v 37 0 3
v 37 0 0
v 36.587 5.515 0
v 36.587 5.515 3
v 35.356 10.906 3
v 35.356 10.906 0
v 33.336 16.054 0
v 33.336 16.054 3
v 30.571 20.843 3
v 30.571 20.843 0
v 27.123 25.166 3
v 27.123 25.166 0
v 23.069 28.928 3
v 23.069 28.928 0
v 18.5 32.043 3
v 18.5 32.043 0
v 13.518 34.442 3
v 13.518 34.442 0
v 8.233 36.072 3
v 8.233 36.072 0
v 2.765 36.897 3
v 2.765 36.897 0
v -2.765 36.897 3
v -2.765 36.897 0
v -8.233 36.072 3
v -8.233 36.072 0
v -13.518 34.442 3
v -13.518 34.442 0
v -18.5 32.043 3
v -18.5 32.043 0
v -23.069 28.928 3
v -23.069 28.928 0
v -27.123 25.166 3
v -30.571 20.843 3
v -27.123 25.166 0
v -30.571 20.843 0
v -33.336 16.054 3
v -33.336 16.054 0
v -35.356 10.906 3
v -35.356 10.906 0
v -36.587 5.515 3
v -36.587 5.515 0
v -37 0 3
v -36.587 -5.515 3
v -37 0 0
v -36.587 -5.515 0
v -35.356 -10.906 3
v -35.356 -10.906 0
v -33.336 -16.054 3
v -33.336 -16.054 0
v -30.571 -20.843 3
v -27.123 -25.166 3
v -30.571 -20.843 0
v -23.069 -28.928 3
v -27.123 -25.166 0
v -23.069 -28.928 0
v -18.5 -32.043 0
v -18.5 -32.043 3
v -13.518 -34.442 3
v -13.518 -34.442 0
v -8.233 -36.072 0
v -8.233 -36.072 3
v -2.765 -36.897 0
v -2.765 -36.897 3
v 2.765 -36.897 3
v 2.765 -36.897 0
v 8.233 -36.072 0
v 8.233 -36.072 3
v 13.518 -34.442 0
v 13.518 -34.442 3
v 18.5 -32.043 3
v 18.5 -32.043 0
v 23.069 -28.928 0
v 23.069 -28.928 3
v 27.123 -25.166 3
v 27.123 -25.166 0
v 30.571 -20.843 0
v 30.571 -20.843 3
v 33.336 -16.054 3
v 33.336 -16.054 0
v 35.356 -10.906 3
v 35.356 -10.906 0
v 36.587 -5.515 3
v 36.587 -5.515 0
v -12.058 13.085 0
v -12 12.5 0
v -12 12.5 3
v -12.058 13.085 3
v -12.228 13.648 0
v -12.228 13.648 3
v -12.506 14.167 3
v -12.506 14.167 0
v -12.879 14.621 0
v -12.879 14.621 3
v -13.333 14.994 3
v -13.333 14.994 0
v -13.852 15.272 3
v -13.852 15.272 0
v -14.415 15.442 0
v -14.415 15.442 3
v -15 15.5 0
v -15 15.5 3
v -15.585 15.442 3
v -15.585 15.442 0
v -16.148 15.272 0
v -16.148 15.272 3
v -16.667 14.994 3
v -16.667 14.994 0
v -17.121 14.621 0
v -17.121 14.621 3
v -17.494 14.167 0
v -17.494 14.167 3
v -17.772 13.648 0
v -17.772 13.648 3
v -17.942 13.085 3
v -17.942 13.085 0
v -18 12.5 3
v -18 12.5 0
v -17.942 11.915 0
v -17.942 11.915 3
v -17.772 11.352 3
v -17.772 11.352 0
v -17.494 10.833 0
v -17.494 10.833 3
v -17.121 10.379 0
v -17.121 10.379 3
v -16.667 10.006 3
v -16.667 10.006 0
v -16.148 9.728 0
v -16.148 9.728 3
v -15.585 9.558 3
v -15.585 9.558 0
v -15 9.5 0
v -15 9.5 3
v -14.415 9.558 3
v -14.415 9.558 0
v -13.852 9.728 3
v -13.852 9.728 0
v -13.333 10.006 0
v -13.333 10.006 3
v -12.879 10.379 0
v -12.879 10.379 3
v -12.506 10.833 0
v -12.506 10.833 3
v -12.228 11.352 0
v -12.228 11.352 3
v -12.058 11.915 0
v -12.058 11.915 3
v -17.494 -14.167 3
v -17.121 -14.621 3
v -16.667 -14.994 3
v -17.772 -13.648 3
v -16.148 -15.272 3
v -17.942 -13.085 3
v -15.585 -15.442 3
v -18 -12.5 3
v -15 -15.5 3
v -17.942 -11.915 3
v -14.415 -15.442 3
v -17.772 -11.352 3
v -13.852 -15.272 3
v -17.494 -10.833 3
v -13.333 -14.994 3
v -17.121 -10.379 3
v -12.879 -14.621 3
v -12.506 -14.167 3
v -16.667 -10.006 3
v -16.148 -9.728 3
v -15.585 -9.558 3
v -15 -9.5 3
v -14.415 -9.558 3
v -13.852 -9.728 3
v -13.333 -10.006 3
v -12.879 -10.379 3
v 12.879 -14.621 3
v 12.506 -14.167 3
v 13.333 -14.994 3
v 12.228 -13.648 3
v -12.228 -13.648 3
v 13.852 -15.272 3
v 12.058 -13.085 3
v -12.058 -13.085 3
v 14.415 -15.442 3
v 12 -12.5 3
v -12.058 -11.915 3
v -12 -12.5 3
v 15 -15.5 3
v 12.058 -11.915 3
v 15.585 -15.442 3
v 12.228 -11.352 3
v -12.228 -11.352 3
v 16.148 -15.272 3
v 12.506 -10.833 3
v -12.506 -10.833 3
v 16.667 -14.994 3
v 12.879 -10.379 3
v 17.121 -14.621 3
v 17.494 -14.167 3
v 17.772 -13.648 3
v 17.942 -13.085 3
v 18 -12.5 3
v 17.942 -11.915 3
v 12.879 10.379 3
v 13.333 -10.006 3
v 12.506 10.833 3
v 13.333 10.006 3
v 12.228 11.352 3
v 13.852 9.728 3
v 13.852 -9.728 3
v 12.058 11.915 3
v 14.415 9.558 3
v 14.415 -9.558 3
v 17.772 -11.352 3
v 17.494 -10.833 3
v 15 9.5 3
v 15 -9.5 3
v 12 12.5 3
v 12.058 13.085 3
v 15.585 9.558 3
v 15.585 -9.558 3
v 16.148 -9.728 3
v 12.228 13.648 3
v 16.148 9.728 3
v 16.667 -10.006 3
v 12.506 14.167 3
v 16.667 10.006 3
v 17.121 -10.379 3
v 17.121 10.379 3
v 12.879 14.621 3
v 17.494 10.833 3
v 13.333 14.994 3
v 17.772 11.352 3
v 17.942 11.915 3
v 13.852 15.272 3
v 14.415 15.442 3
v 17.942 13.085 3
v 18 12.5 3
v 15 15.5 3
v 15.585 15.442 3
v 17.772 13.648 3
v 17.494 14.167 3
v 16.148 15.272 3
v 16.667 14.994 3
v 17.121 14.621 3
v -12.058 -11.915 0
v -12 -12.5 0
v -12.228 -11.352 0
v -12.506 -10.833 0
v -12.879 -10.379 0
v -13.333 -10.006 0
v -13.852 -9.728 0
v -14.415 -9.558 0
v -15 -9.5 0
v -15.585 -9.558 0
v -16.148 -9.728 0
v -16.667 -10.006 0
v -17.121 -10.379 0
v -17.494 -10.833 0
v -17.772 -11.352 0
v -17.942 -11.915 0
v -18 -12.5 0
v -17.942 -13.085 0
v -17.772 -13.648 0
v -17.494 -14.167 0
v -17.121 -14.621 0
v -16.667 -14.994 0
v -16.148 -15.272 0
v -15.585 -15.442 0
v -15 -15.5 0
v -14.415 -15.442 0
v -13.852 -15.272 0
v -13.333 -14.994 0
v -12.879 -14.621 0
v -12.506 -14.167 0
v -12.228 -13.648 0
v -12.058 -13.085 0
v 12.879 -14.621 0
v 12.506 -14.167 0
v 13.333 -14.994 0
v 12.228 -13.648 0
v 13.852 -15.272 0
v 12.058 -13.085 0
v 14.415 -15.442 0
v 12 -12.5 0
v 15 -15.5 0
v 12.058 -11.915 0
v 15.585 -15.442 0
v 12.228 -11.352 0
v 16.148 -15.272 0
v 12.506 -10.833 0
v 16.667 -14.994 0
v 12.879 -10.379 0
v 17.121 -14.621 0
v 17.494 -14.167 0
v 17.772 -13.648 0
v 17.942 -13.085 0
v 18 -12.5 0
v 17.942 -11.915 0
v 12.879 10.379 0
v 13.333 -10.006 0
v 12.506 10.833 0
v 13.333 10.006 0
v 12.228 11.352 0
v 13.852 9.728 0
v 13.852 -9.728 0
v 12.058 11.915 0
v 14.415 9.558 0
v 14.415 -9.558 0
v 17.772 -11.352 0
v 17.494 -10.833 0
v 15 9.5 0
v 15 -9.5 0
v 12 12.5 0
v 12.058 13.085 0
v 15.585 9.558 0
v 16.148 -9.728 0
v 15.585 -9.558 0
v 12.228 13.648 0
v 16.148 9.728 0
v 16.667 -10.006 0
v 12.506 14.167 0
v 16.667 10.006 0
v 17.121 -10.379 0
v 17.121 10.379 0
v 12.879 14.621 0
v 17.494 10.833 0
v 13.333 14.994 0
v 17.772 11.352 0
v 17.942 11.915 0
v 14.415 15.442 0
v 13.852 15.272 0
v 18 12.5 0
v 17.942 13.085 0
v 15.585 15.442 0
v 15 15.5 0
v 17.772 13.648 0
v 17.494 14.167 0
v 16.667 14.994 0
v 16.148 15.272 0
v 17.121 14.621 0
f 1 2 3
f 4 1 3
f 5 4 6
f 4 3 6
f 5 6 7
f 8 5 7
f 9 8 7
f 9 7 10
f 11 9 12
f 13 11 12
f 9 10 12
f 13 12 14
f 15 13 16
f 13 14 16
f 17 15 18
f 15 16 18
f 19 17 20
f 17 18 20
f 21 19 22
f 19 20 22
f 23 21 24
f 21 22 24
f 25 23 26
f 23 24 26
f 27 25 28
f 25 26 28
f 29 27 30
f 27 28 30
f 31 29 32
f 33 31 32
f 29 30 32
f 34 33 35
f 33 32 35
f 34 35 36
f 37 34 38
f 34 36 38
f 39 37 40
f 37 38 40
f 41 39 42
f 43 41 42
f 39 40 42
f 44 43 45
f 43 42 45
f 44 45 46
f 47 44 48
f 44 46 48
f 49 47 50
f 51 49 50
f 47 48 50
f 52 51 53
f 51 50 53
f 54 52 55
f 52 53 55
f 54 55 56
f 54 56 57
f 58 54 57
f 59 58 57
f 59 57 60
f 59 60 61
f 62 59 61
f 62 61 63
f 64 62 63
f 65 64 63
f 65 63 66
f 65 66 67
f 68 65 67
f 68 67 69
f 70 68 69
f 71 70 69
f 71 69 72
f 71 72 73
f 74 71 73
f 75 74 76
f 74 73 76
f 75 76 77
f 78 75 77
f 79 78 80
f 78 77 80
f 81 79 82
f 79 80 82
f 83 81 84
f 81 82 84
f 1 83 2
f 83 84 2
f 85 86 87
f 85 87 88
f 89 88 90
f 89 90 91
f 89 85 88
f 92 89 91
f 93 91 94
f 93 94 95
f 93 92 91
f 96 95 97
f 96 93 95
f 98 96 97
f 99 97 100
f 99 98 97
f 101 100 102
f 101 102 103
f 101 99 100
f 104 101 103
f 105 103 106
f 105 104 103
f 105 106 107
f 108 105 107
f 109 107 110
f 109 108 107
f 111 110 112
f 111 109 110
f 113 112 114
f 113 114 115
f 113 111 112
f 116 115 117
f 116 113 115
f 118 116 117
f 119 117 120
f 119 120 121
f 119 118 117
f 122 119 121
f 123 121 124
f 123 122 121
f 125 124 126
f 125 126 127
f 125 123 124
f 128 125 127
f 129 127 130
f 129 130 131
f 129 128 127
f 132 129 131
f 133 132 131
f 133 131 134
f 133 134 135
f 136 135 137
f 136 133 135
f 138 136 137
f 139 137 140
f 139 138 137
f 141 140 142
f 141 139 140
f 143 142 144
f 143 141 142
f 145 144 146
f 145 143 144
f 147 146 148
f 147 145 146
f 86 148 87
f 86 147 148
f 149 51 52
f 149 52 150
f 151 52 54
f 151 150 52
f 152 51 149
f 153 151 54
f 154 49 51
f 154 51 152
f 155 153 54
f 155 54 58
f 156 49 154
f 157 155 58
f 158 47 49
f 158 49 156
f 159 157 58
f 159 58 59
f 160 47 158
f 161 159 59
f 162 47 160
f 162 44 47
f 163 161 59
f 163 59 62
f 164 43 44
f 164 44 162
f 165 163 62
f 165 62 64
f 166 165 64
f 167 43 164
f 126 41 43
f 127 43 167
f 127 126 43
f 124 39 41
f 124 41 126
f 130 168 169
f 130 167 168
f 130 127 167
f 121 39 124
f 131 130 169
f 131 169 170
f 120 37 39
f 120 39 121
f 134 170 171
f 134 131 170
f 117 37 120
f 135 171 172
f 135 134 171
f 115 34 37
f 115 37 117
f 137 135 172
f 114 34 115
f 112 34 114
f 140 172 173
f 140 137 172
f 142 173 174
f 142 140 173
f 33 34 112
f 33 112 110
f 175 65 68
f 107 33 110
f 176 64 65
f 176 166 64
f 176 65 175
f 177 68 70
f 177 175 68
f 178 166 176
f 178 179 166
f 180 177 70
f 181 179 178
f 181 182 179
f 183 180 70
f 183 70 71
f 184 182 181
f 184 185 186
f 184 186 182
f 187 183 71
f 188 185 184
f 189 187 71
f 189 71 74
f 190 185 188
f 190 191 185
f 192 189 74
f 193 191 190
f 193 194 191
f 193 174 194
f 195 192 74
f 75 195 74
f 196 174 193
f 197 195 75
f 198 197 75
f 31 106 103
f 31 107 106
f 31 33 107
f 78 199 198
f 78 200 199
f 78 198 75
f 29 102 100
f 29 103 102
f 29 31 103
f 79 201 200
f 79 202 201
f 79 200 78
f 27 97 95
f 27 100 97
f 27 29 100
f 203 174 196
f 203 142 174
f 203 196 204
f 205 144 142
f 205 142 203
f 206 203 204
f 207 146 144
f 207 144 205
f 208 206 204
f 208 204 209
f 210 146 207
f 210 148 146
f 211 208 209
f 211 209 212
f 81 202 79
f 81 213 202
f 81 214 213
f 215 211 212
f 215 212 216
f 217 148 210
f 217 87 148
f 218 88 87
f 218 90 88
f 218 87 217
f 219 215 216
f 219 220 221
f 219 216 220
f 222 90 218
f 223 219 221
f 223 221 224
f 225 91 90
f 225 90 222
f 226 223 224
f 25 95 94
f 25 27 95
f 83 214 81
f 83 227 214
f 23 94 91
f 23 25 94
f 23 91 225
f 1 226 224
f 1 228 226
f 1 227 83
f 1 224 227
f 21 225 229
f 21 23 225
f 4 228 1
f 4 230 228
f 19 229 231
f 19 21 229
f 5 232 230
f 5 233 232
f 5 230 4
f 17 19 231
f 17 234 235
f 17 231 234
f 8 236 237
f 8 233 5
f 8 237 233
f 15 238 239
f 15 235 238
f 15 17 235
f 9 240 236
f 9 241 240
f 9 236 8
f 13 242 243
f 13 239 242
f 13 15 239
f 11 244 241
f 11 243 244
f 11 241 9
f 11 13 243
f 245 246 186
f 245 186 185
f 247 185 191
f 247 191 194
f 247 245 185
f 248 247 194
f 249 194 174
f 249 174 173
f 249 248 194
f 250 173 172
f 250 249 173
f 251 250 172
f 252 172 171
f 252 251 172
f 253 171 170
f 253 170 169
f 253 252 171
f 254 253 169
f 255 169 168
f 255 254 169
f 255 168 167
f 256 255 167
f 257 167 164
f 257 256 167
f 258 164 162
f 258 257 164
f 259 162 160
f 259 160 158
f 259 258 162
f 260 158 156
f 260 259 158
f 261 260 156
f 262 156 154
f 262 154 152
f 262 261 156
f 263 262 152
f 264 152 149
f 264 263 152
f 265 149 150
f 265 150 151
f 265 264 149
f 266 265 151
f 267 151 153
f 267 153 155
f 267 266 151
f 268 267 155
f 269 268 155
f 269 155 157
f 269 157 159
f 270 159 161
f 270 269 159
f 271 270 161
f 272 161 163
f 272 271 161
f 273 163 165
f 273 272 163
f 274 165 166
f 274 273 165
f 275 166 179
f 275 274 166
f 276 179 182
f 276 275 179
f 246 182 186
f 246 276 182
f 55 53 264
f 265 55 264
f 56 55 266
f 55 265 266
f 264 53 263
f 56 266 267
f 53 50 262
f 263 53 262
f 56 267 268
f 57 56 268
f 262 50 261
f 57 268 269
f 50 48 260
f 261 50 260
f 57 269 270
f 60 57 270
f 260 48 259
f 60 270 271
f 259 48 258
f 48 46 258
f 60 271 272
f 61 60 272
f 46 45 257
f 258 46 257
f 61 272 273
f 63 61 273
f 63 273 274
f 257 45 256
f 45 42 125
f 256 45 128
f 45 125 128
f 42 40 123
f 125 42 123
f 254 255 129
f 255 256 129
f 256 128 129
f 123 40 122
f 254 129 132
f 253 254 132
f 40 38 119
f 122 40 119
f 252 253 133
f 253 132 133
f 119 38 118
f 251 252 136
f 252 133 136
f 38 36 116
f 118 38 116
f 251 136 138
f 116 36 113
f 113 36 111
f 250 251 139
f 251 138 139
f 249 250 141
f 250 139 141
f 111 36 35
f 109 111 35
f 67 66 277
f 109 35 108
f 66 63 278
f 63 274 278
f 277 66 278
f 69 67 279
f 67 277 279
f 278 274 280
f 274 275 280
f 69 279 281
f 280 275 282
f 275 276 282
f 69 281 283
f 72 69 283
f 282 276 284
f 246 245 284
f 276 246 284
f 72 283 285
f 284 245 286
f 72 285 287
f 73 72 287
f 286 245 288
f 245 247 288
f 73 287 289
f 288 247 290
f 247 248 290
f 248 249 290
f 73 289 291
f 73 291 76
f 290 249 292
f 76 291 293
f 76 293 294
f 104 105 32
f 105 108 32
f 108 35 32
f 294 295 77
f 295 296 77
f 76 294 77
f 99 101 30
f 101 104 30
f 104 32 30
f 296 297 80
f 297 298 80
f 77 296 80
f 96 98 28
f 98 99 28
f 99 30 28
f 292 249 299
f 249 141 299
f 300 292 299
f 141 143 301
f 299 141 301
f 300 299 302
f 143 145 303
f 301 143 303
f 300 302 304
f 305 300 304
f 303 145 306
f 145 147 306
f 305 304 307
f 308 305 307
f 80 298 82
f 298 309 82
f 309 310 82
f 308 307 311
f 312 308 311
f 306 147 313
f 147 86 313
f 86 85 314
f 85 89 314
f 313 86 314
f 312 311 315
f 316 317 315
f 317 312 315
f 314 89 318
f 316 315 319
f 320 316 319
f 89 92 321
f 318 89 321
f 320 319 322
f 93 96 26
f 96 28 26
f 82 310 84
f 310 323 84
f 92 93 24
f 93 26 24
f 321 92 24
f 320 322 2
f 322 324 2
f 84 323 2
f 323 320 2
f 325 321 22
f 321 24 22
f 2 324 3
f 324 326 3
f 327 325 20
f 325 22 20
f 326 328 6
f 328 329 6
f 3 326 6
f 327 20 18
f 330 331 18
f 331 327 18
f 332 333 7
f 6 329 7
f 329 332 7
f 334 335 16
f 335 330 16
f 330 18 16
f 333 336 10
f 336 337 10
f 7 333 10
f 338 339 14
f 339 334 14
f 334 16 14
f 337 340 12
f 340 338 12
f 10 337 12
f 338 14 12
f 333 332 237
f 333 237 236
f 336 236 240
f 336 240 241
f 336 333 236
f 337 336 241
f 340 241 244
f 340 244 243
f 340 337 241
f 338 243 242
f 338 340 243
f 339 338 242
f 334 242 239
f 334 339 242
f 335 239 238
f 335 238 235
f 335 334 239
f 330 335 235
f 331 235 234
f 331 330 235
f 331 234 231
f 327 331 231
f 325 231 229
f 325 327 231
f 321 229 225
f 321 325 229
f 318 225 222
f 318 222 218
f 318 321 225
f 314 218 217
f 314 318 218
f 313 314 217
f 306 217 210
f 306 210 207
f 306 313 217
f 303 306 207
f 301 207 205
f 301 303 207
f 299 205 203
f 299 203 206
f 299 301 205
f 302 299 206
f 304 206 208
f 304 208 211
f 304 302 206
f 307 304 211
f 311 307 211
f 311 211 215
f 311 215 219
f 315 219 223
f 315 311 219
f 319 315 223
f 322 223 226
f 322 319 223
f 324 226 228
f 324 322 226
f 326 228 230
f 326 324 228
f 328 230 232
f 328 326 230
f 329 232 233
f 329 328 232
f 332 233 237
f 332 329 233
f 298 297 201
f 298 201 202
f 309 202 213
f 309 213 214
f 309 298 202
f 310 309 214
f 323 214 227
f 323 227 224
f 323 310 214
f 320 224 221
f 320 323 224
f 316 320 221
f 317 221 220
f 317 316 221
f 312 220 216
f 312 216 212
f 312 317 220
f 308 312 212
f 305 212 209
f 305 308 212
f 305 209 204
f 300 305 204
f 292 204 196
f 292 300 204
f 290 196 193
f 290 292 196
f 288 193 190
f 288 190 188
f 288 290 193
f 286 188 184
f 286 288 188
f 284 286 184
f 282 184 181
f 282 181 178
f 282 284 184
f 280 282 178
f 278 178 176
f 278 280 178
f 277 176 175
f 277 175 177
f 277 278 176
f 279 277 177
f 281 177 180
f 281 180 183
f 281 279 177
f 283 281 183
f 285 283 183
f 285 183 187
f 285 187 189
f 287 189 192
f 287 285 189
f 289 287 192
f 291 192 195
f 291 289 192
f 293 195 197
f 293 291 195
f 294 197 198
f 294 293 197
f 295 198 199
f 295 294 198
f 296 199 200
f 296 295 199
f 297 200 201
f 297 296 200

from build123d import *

# Parameters (mm, degrees)
MODEL_R             = 37
MODEL_R_2           = 3
BOSS_EXTRUDE1_DEPTH = 3


with BuildPart() as part:
    # Model → Boss-Extrude1 (new body)
    with BuildSketch(Plane.XY):
        Circle(MODEL_R)
        with Locations((-15, 12.5)):
            Circle(MODEL_R_2, mode=Mode.SUBTRACT)
        with Locations((-15, -12.5)):
            Circle(MODEL_R_2, mode=Mode.SUBTRACT)
        with Locations((15, -12.5)):
            Circle(MODEL_R_2, mode=Mode.SUBTRACT)
        with Locations((15, 12.5)):
            Circle(MODEL_R_2, mode=Mode.SUBTRACT)
    extrude(amount=BOSS_EXTRUDE1_DEPTH)


solid = part.part
